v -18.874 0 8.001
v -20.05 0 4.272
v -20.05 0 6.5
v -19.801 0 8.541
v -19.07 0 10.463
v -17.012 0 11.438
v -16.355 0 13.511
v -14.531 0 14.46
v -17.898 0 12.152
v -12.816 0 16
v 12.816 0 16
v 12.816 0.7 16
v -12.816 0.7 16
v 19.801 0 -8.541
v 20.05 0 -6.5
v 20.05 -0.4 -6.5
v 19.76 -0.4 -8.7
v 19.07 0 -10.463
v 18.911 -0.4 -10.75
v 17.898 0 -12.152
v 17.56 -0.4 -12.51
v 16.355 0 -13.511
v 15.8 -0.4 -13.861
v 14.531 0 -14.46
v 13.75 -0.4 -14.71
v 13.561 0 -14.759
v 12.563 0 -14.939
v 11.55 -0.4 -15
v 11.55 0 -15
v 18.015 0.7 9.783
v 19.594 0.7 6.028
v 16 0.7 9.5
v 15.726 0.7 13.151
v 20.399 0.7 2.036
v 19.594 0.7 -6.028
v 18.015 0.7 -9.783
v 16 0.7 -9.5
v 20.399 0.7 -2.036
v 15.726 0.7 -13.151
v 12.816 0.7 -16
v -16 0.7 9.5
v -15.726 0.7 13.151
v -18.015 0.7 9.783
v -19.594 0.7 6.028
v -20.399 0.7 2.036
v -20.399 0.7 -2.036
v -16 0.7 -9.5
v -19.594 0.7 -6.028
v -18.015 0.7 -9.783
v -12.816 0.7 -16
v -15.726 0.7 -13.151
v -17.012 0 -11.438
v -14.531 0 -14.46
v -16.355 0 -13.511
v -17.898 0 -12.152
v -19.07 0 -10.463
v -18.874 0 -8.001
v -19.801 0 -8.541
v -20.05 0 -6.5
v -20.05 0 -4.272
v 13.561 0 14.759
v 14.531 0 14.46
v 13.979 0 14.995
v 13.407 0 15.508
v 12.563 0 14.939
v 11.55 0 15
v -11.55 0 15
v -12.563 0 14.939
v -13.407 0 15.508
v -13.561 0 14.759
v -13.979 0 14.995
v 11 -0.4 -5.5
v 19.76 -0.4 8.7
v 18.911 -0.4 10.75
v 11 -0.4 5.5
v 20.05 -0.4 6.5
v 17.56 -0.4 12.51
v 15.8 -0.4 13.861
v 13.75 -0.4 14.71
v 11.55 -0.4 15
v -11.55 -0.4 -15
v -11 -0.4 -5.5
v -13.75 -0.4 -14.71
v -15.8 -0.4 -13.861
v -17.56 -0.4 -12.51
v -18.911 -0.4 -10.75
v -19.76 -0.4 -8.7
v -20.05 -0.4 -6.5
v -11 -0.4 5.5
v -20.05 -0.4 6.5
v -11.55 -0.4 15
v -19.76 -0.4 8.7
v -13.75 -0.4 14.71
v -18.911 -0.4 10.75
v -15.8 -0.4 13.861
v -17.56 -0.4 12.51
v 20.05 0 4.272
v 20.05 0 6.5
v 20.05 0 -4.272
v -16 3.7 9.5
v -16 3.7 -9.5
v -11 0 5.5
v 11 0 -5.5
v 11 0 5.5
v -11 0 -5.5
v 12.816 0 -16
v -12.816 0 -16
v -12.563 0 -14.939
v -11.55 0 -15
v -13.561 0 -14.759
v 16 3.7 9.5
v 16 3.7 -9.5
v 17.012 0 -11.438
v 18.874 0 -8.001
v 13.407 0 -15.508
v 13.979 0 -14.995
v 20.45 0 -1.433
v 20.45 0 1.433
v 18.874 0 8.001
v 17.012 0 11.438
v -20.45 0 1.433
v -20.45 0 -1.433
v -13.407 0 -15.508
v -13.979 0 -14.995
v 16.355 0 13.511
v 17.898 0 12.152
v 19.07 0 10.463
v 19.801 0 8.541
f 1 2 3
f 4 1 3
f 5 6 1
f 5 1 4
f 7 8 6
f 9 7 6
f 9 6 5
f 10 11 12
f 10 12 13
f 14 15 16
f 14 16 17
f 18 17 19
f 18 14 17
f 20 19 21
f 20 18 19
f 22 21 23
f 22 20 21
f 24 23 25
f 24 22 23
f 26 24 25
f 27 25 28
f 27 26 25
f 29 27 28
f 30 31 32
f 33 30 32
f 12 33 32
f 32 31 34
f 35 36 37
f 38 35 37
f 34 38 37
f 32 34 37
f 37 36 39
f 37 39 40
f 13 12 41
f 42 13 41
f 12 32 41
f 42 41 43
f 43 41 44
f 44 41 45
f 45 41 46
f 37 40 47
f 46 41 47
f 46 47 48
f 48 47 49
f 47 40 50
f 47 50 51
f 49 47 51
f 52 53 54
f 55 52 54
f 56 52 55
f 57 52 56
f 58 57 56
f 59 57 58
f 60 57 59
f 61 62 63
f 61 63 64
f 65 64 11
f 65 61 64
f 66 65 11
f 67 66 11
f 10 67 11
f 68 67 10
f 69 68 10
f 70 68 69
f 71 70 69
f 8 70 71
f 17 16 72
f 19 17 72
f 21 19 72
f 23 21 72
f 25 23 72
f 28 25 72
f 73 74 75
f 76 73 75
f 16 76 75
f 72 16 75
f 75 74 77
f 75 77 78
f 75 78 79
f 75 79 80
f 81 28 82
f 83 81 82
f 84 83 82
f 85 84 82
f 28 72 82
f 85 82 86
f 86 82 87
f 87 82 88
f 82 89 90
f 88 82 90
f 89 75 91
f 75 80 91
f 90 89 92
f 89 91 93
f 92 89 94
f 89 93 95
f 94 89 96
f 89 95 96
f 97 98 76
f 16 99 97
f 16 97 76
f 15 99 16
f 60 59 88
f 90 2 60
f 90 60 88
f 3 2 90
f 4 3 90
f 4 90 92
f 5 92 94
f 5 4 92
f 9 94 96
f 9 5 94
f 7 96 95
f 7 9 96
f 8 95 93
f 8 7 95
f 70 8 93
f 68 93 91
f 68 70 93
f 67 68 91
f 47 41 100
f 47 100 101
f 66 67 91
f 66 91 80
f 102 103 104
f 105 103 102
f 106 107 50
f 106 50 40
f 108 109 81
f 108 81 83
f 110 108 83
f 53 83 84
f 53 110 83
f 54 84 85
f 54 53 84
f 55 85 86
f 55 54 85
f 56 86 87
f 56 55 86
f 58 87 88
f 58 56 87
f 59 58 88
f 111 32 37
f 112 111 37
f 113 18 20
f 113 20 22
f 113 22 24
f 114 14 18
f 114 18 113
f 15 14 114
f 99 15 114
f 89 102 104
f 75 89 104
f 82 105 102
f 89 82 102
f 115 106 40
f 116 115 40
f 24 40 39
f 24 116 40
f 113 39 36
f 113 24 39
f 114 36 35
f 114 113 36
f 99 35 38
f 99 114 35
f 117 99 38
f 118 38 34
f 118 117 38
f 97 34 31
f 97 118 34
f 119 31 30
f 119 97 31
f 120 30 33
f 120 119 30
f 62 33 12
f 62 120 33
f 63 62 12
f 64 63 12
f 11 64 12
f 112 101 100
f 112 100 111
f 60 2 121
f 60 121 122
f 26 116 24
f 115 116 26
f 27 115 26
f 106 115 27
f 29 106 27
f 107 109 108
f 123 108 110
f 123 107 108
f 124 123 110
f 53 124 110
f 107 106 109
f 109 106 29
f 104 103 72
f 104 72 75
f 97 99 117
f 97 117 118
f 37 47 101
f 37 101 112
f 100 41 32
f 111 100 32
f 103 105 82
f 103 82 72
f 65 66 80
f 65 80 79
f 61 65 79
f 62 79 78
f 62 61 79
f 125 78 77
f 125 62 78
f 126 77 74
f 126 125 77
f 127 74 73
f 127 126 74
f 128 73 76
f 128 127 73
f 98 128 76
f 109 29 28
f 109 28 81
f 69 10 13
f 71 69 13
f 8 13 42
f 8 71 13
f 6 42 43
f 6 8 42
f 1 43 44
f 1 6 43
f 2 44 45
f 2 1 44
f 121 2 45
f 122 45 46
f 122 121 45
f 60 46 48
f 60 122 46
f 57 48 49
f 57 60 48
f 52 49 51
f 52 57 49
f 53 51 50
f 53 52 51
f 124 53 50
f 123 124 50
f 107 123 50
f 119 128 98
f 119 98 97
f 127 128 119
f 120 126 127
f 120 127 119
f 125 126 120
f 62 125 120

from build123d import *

# Parameters (mm, degrees)
EXTRUDE_1_DEPTH = 0.7
SKETCH_2_W      = 22
SKETCH_2_H      = 11
EXTRUDE_2_DEPTH = 0.4
SKETCH_3_W      = 32
SKETCH_3_H      = 19
EXTRUDE_3_DEPTH = 3


with BuildPart() as part:
    # Эскиз1 → Бобышка-Вытянуть1 (new body)
    with BuildSketch(Plane(origin=(0, 0, 0), x_dir=(1, 0, 0), z_dir=(0, 1, 0))):
        with BuildLine():
            Line((-12.816005618, 16), (12.816005618, 16))
            ThreePointArc((12.816005618, 16), (20.5, 0), (12.816005618, -16))
            Line((12.816005618, -16), (-12.816005618, -16))
            ThreePointArc((-12.816005618, -16), (-20.5, 0), (-12.816005618, 16))
        make_face()
    extrude(amount=EXTRUDE_1_DEPTH)

    # Эскиз2 → Бобышка-Вытянуть2 (add)
    with BuildSketch(Plane.XZ):
        with BuildLine():
            Line((-11.55, 15), (11.55, 15))
            ThreePointArc((11.55, 15), (17.56040764, 12.51040764), (20.05, 6.5))
            Line((20.05, 6.5), (20.05, -6.5))
            ThreePointArc((20.05, -6.5), (17.56040764, -12.51040764), (11.55, -15))
            Line((11.55, -15), (-11.55, -15))
            ThreePointArc((-11.55, -15), (-17.56040764, -12.51040764), (-20.05, -6.5))
            Line((-20.05, -6.5), (-20.05, 6.5))
            ThreePointArc((-20.05, 6.5), (-17.56040764, 12.51040764), (-11.55, 15))
        make_face()
        Rectangle(SKETCH_2_W, SKETCH_2_H, mode=Mode.SUBTRACT)
    extrude(amount=EXTRUDE_2_DEPTH)

    # Эскиз3 → Бобышка-Вытянуть3 (add)
    with BuildSketch(Plane(origin=(0, 0.7, 0), x_dir=(1, 0, 0), z_dir=(0, 1, 0))):
        Rectangle(SKETCH_3_W, SKETCH_3_H)
    extrude(amount=EXTRUDE_3_DEPTH)


solid = part.part
